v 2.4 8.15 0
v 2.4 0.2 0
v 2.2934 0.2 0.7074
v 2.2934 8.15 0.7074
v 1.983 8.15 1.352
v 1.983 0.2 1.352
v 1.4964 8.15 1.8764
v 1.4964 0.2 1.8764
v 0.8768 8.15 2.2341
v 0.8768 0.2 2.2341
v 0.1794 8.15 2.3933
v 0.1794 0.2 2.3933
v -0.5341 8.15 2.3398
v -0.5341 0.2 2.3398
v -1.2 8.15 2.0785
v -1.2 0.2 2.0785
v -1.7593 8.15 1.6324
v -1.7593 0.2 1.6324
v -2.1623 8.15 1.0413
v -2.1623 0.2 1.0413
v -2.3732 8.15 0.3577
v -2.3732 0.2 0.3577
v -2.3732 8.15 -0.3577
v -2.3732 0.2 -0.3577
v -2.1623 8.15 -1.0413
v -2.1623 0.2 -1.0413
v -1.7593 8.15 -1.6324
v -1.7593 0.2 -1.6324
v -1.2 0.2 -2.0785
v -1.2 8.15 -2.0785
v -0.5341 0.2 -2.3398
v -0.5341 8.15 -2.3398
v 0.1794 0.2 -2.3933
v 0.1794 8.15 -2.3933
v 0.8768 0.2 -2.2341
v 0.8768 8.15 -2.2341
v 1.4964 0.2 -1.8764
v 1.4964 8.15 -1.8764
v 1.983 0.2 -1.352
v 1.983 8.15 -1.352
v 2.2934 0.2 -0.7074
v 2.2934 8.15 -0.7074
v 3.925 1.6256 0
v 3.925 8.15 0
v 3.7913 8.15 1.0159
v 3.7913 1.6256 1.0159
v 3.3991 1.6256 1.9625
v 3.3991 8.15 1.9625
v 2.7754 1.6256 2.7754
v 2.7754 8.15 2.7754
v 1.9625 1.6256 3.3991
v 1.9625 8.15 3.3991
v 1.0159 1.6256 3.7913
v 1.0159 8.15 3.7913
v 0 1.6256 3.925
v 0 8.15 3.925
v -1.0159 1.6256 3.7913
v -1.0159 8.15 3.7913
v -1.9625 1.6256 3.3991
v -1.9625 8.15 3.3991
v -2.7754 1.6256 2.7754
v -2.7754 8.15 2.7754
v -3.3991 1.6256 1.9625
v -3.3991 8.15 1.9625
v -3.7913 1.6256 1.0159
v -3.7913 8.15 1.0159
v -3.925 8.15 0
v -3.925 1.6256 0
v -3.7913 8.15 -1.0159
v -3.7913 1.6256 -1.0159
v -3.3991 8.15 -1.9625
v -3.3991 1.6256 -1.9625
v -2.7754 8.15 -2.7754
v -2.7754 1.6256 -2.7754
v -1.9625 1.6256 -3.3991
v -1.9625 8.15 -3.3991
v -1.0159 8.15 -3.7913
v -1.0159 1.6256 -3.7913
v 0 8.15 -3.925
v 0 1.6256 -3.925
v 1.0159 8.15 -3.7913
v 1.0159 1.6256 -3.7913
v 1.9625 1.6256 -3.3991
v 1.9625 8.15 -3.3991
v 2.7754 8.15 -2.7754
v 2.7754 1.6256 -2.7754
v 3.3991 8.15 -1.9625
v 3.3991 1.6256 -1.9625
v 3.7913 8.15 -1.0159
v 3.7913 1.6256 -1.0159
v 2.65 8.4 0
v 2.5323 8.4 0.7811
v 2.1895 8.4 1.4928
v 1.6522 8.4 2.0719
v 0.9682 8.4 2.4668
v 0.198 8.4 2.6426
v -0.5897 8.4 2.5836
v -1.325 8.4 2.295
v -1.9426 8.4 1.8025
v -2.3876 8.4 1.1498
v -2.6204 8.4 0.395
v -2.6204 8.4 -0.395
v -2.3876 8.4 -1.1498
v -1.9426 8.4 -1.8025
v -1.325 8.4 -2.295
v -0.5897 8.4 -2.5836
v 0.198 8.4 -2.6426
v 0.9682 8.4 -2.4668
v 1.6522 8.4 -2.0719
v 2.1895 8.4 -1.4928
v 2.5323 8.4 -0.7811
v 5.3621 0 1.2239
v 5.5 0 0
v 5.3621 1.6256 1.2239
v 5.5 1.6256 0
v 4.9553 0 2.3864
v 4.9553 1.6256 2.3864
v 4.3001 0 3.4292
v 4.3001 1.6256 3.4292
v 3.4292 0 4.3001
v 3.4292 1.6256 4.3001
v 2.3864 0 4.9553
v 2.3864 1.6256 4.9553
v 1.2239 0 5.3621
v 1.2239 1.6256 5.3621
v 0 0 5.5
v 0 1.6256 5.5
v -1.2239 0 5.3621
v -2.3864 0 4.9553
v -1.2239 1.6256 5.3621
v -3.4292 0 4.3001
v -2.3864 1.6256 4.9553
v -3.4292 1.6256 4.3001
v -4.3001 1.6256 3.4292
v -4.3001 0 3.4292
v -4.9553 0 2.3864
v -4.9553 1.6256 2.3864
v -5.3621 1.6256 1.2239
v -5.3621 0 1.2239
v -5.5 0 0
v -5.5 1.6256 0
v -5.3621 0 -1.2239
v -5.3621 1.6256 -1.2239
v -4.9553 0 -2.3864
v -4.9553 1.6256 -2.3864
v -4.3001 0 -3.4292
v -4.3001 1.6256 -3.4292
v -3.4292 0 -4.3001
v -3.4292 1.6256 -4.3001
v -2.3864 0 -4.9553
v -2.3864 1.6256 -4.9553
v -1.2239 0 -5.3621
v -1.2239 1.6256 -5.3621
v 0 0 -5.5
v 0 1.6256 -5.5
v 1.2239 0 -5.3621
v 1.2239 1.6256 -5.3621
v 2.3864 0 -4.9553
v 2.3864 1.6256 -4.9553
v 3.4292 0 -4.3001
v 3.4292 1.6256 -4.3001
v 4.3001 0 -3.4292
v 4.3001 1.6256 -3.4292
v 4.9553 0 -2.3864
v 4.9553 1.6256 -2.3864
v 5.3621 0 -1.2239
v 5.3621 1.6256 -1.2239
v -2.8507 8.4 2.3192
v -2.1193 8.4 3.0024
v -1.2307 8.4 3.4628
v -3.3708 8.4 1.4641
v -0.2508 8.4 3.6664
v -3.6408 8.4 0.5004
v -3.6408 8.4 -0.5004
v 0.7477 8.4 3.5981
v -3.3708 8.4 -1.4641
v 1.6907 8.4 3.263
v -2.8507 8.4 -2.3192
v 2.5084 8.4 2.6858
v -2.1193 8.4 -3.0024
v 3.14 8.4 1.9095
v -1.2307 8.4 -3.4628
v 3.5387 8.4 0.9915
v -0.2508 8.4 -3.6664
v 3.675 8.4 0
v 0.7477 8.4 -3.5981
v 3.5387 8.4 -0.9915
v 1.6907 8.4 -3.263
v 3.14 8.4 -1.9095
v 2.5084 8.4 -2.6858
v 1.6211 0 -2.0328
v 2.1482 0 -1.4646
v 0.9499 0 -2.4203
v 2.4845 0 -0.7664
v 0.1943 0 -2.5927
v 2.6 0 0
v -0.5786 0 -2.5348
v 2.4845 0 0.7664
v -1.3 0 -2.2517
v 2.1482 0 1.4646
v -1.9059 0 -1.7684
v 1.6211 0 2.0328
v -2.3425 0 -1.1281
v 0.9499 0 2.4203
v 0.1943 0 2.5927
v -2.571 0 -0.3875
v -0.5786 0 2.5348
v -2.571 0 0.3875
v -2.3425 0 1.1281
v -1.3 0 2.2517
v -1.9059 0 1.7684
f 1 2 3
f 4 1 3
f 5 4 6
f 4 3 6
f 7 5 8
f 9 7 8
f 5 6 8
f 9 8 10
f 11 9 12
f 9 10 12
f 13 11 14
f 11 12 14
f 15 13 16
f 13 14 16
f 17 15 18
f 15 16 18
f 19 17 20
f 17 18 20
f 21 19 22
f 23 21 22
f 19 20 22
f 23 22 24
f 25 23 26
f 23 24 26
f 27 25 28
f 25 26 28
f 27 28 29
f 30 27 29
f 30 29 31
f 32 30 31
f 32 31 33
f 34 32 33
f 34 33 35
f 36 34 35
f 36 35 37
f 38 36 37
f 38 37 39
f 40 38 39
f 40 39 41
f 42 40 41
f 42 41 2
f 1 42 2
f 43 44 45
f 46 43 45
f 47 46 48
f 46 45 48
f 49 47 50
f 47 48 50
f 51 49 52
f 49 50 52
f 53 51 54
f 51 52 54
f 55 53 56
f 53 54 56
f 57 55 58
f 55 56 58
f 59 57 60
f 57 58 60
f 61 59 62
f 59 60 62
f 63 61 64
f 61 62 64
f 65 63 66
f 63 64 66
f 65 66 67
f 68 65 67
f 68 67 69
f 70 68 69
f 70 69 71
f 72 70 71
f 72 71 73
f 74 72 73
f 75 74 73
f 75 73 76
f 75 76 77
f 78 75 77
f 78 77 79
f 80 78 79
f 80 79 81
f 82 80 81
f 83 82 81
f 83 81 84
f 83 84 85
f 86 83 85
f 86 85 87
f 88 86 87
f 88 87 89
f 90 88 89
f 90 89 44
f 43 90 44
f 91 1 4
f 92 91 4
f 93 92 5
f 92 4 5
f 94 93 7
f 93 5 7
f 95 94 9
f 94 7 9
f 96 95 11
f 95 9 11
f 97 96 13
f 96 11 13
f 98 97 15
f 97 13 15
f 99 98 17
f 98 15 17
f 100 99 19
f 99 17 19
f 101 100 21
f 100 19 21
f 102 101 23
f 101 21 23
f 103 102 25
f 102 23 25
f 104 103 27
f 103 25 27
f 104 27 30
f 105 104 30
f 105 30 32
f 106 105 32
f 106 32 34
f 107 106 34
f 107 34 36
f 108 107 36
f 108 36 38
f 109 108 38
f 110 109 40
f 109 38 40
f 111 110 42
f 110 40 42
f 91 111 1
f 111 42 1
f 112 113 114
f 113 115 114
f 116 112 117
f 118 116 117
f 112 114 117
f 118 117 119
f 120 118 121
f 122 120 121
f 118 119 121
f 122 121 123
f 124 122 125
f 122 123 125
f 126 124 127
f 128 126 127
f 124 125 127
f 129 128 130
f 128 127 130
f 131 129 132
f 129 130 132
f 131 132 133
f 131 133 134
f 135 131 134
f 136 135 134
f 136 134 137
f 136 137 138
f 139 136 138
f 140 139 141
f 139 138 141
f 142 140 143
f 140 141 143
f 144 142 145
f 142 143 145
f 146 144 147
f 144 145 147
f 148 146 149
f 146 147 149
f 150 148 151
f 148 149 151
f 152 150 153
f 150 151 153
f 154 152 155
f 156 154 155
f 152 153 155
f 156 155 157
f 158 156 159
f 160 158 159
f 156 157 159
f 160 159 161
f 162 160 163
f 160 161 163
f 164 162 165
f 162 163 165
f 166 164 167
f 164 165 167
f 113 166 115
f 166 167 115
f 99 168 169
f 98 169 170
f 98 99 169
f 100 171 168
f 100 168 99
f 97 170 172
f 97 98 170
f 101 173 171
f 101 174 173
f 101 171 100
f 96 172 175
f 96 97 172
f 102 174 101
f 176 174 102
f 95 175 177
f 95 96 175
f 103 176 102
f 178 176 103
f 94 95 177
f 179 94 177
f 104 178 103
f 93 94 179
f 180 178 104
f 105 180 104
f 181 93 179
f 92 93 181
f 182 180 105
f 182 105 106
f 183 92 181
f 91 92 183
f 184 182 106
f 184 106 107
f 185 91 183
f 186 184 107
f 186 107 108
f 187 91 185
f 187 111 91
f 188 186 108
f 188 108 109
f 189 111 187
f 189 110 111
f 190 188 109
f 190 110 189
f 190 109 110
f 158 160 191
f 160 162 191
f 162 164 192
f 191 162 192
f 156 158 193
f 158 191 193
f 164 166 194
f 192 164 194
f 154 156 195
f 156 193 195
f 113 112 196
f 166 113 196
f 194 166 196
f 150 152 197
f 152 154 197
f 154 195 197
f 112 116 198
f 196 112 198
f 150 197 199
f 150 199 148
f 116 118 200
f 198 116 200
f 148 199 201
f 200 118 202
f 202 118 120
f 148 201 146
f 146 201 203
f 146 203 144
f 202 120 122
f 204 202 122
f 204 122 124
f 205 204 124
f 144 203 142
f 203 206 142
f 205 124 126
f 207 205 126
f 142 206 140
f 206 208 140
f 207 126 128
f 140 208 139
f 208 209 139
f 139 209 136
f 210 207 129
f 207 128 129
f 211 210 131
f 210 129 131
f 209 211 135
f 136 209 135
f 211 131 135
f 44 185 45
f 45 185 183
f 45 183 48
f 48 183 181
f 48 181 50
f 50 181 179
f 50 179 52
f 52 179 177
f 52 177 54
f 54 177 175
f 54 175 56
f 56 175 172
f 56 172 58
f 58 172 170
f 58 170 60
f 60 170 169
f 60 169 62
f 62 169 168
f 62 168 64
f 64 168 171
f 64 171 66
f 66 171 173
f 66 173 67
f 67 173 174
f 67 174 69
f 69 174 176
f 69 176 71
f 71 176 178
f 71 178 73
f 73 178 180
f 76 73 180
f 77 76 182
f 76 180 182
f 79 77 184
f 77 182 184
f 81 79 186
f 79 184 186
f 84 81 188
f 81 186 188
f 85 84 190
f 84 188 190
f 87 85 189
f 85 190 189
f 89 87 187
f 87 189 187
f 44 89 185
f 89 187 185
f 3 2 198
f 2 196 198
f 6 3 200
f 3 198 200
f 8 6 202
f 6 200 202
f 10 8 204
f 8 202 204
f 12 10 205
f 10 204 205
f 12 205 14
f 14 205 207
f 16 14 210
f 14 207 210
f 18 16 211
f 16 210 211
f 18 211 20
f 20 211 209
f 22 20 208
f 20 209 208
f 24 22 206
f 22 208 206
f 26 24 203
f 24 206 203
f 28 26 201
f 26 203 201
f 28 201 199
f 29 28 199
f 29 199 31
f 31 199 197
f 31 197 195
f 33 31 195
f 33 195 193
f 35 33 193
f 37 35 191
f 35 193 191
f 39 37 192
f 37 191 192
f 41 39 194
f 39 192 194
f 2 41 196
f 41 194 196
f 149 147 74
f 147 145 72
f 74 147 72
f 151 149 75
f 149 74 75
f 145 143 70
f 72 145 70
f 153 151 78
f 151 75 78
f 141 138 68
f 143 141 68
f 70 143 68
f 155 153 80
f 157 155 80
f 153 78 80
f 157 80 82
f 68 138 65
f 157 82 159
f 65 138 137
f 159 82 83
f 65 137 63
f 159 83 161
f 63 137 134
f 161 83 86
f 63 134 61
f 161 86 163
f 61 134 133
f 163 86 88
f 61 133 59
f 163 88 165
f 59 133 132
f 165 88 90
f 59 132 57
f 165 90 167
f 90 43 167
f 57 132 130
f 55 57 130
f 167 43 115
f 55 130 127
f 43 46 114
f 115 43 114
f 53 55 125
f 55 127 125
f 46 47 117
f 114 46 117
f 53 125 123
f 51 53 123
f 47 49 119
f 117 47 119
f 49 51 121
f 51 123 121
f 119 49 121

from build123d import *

# Parameters (mm, degrees)
SKETCH2_W               = 14
SKETCH2_H               = 8
CUT_EXTRUDE1_DEPTH      = 6.5
CUT_EXTRUDE1_DEPTH_BACK = 6.5
CHAMFER1_SIZE           = 0.25


with BuildPart() as part:
    # Sketch1 → Revolve1 (revolve)
    with BuildSketch(Plane.XY):
        Polygon((3.925, 1.6256), (3.925, 12.4), (2.4, 12.4), (2.4, 0.2), (2.6, 0), (5.5, 0), (5.5, 1.6256), align=None)
    revolve(axis=Axis((0, 0, 0), (0, -1, 0)))

    # Sketch2 → Cut-Extrude1 (cut, two sides)
    with BuildSketch(Plane.XY) as cut_extrude1_sk:
        with Locations((0, 12.4)):
            Rectangle(SKETCH2_W, SKETCH2_H)
    extrude(amount=CUT_EXTRUDE1_DEPTH, mode=Mode.SUBTRACT)
    extrude(cut_extrude1_sk.sketch, amount=-CUT_EXTRUDE1_DEPTH_BACK, mode=Mode.SUBTRACT)

    # Chamfer1
    chamfer1_edges = [part.edges().sort_by_distance(p)[0] for p in [
        (-3.925, 8.4, 0),
        (-2.4, 8.4, 0),
    ]]
    chamfer(chamfer1_edges, length=CHAMFER1_SIZE)


solid = part.part
